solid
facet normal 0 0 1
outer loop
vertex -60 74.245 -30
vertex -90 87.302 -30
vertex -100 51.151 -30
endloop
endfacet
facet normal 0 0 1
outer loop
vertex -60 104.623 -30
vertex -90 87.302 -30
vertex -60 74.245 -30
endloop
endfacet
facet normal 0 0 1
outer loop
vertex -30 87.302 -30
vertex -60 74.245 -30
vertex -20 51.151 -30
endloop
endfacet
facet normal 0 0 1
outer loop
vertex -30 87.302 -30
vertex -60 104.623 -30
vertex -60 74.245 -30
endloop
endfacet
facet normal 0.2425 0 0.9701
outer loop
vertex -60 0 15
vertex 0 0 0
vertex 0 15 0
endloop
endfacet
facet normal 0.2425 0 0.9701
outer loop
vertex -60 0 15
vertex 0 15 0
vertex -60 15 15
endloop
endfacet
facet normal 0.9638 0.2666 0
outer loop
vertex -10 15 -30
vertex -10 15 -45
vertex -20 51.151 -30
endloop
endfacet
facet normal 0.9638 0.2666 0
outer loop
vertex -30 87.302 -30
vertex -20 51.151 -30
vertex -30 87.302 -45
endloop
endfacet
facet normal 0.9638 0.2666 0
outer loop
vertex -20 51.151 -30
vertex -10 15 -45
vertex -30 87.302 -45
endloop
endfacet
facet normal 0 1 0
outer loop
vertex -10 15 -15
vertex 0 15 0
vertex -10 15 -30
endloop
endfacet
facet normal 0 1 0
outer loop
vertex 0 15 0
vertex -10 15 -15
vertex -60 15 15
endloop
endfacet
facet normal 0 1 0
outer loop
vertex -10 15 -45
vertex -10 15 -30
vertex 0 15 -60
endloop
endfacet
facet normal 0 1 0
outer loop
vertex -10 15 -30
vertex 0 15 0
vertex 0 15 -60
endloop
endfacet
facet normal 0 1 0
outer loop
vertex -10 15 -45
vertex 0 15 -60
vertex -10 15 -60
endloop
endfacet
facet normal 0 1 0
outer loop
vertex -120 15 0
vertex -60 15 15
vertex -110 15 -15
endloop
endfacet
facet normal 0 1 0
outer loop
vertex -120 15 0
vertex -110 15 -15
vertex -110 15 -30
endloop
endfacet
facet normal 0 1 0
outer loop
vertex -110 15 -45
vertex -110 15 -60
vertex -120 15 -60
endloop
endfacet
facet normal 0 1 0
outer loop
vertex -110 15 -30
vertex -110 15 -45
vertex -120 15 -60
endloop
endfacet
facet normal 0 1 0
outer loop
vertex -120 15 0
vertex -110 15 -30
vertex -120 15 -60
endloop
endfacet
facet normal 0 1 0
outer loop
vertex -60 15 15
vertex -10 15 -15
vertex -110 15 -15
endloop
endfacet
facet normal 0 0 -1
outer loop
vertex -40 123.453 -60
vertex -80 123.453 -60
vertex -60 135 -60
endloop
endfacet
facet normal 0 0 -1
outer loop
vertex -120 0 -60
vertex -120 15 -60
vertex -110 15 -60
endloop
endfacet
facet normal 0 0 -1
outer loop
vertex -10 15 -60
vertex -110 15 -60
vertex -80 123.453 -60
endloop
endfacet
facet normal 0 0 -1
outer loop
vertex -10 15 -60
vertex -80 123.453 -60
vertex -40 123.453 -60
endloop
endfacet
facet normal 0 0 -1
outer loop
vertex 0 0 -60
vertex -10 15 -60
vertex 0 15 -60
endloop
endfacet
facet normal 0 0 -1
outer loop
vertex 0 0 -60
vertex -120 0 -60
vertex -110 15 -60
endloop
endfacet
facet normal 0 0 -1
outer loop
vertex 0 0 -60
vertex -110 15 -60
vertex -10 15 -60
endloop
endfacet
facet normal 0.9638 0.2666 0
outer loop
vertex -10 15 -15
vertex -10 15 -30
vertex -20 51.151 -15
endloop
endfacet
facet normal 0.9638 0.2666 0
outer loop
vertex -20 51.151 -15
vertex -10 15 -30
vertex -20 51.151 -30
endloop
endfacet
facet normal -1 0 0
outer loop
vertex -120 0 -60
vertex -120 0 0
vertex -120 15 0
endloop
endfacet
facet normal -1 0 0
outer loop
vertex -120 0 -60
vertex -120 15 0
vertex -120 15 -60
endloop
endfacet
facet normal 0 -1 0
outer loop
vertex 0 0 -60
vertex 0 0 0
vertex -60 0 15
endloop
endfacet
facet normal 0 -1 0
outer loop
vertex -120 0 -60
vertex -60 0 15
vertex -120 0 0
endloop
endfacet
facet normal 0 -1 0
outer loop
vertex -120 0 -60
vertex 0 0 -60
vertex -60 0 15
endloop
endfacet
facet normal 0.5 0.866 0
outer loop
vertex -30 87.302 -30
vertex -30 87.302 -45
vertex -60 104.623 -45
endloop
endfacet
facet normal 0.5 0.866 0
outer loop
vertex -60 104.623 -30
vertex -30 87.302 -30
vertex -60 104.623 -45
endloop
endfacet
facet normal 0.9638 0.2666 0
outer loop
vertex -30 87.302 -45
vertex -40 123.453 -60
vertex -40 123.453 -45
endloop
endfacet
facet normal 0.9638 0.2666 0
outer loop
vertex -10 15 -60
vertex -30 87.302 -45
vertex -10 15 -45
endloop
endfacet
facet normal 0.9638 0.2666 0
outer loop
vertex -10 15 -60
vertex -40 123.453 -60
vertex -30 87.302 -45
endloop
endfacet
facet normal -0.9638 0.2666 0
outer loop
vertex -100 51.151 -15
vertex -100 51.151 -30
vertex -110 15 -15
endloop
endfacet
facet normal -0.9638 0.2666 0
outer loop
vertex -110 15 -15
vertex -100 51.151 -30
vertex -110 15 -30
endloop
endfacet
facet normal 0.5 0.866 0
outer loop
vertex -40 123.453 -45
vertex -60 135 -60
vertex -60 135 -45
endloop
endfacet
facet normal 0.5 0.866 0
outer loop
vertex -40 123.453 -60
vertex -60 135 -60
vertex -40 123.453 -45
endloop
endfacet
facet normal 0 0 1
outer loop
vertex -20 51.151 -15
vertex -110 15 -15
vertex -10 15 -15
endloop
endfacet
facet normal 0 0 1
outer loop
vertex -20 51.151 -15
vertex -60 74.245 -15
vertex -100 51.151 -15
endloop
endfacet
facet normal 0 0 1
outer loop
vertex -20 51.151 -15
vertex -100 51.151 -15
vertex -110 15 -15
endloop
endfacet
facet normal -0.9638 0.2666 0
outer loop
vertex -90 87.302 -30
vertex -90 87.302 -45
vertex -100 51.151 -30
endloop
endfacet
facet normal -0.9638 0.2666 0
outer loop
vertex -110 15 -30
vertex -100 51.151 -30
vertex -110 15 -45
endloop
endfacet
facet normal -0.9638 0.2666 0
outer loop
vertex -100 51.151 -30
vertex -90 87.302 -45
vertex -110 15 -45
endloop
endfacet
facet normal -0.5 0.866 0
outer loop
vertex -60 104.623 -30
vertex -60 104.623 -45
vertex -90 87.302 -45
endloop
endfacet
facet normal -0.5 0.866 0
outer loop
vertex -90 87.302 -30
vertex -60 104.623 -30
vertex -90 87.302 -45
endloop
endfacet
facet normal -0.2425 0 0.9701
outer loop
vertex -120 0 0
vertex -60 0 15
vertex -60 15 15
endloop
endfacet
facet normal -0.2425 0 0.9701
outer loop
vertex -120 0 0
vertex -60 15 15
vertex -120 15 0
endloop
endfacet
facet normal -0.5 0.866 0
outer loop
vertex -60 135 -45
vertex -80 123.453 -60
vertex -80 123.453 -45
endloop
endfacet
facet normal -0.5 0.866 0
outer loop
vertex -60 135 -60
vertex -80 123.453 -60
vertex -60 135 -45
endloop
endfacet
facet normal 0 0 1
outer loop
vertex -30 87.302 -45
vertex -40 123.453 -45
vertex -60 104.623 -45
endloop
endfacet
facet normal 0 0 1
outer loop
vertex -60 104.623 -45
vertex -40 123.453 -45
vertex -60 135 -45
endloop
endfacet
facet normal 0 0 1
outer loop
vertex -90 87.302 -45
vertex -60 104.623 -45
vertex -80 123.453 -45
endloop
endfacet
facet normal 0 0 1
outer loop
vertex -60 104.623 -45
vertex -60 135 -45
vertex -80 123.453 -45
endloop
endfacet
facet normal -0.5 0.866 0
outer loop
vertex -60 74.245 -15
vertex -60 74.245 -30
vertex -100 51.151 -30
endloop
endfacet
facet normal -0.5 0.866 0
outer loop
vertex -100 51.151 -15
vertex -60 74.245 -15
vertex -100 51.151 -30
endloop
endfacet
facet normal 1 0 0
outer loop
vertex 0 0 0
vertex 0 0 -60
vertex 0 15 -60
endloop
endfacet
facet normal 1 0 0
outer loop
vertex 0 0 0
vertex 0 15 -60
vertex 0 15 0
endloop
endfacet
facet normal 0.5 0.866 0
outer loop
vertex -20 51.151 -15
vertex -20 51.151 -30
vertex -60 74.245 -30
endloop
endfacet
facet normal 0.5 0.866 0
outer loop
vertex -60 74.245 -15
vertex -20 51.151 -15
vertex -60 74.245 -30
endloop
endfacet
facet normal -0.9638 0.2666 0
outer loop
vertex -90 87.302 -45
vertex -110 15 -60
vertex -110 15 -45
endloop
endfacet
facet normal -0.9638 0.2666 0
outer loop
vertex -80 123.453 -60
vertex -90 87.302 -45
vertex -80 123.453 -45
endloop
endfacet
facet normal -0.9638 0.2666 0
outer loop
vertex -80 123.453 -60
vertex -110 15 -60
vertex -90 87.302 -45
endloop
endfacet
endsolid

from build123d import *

# Parameters (mm, degrees)
EXTRUDE1_DEPTH = 15
EXTRUDE2_DEPTH = 15
EXTRUDE3_DEPTH = 15
EXTRUDE4_DEPTH = 15


with BuildPart() as part:
    # Sketch1 → Extrude1 (new body)
    with BuildSketch(Plane(origin=(0, 0, 0), x_dir=(1, 0, 0), z_dir=(0, 1, 0))):
        Polygon((0, 0), (-60, -15), (-120, 0), (-120, 60), (0, 60), align=None)
    extrude(amount=EXTRUDE1_DEPTH)

    # Sketch2 → Extrude2 (add)
    with BuildSketch(Plane(origin=(0, 0, -60), x_dir=(-1, 0, 0), z_dir=(0, 0, -1))):
        Polygon((110, 15), (80, 123.452994616), (60, 135), (40, 123.452994616), (10, 15), align=None)
    extrude(amount=-EXTRUDE2_DEPTH)

    # Sketch3 → Extrude3 (add)
    with BuildSketch(Plane.XY.offset(-45)):
        Polygon((-10, 15), (-30, 87.301996411), (-60, 104.622504486), (-90, 87.301996411), (-110, 15), align=None)
    extrude(amount=EXTRUDE3_DEPTH)

    # Sketch4 → Extrude4 (add)
    with BuildSketch(Plane.XY.offset(-30)):
        Polygon((-110, 15), (-10, 15), (-20, 51.150998205), (-60, 74.245008973), (-100, 51.150998205), align=None)
    extrude(amount=EXTRUDE4_DEPTH)


solid = part.part
